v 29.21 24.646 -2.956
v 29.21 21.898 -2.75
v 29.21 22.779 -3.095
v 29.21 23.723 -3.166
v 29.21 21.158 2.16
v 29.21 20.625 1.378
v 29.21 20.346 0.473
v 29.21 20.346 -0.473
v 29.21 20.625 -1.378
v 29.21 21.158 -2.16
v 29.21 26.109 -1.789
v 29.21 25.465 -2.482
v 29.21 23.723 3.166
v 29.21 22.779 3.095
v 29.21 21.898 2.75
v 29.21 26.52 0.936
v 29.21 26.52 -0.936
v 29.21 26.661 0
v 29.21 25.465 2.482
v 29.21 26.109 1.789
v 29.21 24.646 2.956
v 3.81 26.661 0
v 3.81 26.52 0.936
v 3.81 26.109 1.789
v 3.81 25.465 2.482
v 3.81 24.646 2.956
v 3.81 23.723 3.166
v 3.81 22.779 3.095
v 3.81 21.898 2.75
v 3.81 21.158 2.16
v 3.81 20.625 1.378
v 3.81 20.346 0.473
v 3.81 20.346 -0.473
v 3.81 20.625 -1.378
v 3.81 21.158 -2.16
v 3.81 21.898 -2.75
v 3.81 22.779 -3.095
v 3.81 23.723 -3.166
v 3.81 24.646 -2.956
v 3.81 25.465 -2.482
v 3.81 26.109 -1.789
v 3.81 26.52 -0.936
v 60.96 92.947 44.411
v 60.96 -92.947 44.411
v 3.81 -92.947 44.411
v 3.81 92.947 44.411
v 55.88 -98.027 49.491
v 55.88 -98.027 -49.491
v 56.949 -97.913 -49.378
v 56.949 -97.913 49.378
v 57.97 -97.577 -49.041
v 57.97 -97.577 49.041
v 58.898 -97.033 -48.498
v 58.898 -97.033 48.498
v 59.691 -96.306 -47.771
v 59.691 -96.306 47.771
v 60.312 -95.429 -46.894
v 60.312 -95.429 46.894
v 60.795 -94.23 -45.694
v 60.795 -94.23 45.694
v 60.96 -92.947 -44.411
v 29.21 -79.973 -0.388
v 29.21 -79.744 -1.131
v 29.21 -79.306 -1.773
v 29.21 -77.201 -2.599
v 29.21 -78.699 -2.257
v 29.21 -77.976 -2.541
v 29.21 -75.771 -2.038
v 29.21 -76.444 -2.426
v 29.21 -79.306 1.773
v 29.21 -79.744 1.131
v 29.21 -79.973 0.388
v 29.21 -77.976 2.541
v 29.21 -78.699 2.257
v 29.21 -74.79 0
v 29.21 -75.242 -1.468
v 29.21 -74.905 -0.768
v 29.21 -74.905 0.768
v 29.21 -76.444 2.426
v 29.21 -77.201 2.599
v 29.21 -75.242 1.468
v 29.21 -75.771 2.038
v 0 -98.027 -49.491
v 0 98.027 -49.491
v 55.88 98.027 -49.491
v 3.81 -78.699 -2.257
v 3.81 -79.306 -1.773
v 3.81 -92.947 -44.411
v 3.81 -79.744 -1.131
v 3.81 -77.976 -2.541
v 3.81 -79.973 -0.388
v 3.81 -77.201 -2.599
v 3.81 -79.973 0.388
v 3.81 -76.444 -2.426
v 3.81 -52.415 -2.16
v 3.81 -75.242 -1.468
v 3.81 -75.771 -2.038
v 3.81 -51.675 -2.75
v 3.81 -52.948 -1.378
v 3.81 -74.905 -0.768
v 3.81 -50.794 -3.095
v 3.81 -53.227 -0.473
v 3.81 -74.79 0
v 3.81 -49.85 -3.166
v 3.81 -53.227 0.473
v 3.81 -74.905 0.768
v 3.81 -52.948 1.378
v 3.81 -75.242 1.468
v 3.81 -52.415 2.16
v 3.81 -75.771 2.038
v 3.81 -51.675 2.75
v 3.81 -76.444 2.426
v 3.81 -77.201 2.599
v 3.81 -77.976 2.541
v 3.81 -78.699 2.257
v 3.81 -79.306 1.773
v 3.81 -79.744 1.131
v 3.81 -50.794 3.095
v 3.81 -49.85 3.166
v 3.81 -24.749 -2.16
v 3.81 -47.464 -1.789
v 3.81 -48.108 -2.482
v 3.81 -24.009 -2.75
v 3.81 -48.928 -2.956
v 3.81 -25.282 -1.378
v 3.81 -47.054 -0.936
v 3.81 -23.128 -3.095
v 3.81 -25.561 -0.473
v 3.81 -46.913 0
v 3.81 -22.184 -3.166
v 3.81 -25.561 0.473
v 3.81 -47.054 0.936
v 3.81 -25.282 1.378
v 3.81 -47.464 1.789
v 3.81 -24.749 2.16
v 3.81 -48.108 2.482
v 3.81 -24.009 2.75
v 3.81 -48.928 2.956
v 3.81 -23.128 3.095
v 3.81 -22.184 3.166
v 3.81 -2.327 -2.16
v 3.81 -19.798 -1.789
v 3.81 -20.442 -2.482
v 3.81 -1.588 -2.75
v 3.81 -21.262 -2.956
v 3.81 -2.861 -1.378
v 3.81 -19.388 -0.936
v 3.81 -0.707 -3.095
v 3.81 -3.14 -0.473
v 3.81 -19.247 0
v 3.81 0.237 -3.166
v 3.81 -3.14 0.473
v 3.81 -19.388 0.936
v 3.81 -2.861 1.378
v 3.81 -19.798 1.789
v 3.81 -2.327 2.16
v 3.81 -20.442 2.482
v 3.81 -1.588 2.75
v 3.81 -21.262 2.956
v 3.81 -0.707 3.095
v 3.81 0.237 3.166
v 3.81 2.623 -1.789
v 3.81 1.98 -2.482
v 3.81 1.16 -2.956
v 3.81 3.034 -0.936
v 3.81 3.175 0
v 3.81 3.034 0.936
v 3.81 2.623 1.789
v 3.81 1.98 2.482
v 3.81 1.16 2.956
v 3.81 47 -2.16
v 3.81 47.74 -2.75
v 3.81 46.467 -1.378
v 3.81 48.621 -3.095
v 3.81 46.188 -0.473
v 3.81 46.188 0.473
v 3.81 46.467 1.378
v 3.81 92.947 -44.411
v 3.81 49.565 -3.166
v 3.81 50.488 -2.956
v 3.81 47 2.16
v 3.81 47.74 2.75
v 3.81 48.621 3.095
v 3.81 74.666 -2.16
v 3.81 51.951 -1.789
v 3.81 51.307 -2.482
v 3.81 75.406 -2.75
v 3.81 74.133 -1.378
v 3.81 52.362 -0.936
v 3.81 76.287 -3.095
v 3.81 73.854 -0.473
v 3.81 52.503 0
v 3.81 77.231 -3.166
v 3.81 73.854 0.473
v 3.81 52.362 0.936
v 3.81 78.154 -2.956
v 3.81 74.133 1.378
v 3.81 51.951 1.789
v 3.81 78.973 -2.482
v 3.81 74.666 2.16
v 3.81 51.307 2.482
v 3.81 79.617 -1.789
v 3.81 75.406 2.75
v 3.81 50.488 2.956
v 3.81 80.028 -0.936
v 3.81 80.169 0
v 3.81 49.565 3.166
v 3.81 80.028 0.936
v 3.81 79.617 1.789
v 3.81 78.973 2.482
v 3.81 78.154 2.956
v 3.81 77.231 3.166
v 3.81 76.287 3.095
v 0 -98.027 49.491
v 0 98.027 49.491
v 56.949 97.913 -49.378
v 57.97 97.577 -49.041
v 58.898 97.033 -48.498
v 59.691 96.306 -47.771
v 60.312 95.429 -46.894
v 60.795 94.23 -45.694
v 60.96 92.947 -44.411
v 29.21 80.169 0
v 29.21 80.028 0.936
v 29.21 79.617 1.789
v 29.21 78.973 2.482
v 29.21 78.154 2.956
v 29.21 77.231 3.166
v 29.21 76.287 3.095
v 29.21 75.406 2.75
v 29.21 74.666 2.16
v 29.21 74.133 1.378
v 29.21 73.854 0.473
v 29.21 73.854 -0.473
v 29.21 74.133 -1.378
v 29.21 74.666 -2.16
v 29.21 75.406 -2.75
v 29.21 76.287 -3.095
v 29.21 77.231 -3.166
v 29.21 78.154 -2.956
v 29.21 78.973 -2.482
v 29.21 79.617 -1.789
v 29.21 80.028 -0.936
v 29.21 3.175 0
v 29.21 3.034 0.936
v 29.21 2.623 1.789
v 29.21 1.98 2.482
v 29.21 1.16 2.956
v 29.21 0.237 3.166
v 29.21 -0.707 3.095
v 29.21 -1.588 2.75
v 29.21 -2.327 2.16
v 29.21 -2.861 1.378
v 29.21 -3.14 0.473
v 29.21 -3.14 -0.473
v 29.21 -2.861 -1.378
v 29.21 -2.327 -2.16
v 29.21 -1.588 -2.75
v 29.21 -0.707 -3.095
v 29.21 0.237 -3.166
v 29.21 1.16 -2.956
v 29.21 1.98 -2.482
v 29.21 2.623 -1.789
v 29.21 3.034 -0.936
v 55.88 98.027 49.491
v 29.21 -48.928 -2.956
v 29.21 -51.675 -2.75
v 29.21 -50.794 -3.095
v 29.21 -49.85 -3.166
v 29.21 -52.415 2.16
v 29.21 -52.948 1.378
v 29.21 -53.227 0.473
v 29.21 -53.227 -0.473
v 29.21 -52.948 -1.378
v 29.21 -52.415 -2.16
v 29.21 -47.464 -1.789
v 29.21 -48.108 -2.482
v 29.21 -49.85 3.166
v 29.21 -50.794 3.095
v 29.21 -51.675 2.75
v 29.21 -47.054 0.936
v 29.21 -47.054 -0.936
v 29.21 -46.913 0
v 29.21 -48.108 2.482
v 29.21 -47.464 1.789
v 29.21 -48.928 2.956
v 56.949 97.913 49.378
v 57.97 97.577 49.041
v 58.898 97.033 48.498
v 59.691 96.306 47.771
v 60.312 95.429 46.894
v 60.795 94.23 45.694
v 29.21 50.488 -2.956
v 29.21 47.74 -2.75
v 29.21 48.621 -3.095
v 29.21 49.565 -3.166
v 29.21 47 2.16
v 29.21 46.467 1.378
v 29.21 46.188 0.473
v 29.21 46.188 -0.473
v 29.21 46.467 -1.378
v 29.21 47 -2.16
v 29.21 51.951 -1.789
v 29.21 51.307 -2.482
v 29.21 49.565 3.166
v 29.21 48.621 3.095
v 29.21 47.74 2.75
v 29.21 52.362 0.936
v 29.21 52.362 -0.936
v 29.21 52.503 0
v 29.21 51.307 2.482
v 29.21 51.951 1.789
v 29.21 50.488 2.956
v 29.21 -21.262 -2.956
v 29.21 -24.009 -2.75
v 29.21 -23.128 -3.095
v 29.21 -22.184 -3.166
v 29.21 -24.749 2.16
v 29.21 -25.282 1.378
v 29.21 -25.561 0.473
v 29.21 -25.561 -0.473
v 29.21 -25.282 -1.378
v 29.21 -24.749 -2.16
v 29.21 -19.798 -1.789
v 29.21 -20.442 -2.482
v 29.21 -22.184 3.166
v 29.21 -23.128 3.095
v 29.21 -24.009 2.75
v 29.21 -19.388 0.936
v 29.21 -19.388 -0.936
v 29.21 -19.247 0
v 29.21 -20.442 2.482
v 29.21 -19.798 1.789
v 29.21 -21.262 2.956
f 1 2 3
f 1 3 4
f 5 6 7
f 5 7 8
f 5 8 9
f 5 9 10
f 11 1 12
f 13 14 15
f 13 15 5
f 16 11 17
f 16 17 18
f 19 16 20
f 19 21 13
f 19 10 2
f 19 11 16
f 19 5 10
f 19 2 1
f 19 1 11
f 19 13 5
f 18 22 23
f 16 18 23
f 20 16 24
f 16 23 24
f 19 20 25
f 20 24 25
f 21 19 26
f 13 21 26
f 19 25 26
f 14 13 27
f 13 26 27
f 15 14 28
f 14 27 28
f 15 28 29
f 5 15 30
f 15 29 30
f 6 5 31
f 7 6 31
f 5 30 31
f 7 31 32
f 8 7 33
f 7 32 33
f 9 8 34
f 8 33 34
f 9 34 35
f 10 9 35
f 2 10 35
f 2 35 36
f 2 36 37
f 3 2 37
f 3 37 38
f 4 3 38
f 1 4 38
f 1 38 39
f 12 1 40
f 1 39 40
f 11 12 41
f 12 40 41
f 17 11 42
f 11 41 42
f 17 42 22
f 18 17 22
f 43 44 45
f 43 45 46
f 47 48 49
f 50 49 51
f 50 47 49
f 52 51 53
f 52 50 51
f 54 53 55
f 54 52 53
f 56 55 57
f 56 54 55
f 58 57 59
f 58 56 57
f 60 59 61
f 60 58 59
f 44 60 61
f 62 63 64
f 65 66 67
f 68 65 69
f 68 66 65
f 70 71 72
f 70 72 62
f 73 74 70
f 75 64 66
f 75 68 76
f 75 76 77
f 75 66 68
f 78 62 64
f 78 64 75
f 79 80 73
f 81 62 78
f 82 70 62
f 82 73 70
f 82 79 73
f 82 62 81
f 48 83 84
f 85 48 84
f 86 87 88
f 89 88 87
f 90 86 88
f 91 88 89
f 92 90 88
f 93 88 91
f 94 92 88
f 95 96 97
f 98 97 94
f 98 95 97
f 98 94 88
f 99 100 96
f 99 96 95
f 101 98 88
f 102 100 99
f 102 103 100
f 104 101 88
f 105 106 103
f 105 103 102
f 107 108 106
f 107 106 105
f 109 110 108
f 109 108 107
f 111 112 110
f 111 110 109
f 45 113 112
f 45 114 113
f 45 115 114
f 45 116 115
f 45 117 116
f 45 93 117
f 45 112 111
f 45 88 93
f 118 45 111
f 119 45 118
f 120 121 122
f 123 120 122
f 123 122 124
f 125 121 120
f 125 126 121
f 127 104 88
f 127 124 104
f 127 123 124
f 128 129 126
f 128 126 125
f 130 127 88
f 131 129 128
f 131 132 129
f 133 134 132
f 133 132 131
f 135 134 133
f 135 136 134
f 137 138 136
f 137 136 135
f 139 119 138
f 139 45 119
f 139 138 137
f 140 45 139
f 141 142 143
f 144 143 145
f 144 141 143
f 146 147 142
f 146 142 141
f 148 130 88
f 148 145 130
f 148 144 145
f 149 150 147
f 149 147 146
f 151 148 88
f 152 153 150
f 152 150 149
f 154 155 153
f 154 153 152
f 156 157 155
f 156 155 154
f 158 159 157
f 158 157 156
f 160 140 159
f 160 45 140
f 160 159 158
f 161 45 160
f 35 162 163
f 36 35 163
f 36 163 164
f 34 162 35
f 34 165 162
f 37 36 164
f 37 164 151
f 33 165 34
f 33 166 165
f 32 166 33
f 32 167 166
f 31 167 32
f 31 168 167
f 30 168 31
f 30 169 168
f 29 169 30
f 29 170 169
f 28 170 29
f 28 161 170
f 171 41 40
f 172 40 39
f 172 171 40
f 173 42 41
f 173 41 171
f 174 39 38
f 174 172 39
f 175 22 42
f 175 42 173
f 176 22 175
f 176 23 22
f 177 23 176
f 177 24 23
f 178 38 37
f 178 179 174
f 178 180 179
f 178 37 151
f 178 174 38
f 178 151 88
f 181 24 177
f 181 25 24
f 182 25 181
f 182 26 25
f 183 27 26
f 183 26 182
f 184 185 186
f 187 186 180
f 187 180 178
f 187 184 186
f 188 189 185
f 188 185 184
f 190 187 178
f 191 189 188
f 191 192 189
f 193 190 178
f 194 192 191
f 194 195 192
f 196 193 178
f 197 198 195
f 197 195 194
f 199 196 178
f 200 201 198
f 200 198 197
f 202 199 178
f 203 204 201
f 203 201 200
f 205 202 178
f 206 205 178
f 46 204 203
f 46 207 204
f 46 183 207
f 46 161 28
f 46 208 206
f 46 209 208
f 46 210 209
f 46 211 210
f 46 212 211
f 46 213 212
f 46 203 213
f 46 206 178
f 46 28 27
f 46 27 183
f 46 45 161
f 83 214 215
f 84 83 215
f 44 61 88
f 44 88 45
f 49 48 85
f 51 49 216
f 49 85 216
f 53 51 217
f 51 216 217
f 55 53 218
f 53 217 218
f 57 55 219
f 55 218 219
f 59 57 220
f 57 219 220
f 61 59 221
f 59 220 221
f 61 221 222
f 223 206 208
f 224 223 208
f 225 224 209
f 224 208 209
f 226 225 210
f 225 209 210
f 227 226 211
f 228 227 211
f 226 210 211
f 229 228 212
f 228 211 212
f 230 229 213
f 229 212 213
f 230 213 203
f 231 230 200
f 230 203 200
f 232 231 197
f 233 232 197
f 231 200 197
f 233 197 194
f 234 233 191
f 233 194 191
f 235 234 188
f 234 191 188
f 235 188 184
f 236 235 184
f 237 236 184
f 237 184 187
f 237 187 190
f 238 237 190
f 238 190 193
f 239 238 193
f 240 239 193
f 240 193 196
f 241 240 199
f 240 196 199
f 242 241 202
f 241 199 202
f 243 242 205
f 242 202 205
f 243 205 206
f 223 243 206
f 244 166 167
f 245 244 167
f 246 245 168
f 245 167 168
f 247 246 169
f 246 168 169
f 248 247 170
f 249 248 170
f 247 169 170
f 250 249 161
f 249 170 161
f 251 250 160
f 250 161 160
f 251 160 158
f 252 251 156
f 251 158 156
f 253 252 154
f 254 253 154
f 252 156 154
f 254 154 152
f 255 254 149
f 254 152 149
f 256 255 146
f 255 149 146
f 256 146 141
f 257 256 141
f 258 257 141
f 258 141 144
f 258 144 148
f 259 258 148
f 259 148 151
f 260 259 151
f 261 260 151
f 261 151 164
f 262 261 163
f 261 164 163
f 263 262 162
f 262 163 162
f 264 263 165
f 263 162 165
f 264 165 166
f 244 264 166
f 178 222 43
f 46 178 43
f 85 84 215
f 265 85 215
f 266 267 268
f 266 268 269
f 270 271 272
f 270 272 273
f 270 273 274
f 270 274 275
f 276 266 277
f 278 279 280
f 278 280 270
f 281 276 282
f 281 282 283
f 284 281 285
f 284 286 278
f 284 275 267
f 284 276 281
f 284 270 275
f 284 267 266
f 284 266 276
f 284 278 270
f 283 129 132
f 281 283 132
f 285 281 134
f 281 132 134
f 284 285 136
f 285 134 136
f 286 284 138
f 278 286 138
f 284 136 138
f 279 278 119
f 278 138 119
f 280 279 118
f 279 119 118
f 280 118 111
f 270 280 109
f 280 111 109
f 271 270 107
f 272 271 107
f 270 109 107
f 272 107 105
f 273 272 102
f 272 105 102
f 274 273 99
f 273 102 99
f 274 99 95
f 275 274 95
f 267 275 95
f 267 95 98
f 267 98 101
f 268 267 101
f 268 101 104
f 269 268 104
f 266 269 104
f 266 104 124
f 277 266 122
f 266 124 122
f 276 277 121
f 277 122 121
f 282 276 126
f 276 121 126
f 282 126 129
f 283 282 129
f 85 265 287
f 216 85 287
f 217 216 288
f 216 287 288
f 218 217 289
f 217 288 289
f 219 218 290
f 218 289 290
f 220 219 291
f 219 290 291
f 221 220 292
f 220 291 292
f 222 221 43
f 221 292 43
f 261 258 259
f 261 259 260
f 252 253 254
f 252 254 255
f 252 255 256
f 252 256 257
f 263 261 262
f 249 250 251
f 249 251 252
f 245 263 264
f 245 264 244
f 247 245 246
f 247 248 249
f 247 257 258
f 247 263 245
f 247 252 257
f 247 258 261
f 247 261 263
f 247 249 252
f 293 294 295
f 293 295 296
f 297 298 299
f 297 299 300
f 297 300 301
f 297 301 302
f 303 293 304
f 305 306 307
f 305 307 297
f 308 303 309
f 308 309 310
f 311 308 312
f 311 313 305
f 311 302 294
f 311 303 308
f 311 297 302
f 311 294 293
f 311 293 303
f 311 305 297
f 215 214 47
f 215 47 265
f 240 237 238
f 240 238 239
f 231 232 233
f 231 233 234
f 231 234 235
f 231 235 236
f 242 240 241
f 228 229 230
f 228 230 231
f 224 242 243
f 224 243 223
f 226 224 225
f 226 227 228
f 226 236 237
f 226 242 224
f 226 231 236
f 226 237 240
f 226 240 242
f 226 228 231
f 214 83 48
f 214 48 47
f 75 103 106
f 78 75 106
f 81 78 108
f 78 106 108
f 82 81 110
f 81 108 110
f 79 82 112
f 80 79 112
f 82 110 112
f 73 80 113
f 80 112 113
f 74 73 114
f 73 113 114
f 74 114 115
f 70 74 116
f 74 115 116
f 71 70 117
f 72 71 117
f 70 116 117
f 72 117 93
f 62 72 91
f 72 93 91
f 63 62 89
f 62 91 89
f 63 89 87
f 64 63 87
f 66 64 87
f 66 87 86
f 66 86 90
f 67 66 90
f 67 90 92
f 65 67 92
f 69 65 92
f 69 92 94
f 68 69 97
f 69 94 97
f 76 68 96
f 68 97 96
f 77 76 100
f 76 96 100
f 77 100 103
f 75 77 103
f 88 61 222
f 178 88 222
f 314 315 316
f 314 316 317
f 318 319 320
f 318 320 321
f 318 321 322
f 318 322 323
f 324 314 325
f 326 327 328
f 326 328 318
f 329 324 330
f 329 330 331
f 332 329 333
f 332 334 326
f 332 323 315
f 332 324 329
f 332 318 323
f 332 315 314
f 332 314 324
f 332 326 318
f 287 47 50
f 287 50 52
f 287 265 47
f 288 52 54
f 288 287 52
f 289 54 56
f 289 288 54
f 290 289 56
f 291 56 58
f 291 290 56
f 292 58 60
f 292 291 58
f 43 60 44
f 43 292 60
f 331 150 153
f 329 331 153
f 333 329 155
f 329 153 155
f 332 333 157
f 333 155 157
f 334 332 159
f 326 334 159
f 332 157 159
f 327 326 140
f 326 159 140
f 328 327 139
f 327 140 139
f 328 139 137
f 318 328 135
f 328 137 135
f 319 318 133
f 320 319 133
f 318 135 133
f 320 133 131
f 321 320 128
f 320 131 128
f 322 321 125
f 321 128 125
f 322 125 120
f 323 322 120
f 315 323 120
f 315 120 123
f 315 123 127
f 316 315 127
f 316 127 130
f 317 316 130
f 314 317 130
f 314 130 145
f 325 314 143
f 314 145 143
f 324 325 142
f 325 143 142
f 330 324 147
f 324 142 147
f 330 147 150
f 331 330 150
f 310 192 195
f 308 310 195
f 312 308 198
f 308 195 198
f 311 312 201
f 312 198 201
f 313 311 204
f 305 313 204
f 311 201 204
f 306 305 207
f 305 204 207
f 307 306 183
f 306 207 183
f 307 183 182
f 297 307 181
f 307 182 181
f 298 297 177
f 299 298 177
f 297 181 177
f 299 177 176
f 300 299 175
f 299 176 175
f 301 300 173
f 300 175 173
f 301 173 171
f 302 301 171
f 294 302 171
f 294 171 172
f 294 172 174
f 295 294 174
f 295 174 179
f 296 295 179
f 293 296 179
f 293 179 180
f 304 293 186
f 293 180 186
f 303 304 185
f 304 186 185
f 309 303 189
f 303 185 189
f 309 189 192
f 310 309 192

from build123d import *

# Parameters (mm, degrees)
F0_W     = 196.053922
F0_H     = 98.98296
F1_DEPTH = 60.96
F2_R     = 5.08
F3_W     = 185.893922
F3_H     = 88.82296
F4_DEPTH = 57.15
F6_R     = 3.175
F6_R_2   = 2.606289
F7_DEPTH = 25.4


with BuildPart() as f1:
    # F0 (on Right) → F1 (new body)
    with BuildSketch(Plane.YZ):
        Rectangle(F0_W, F0_H)
    extrude(amount=F1_DEPTH)

    # F2
    f2_edges = [f1.edges().sort_by_distance(p)[0] for p in [
        (60.96, 98.026961, 0),
        (60.96, 0, 49.49148),
        (60.96, -98.026961, 0),
        (60.96, 0, -49.49148),
    ]]
    fillet(f2_edges, radius=F2_R)

    # F3 (on face) → F4 (cut)
    with BuildSketch(Plane.YZ.offset(60.96)):
        Rectangle(F3_W, F3_H)
    extrude(amount=-F4_DEPTH, mode=Mode.SUBTRACT)

    # F6 (on face) → F7 (join)
    with BuildSketch(Plane.YZ.offset(3.81)):
        Circle(F6_R)
        with Locations((23.48576, 0)):
            Circle(F6_R)
        with Locations((49.327695, 0)):
            Circle(F6_R)
        with Locations((76.993772, 0)):
            Circle(F6_R)
        with Locations((-22.421679, 0)):
            Circle(F6_R)
        with Locations((-50.087753, 0)):
            Circle(F6_R)
        with Locations((-77.395896, 0)):
            Circle(F6_R_2)
    extrude(amount=F7_DEPTH)


solid = f1.part
